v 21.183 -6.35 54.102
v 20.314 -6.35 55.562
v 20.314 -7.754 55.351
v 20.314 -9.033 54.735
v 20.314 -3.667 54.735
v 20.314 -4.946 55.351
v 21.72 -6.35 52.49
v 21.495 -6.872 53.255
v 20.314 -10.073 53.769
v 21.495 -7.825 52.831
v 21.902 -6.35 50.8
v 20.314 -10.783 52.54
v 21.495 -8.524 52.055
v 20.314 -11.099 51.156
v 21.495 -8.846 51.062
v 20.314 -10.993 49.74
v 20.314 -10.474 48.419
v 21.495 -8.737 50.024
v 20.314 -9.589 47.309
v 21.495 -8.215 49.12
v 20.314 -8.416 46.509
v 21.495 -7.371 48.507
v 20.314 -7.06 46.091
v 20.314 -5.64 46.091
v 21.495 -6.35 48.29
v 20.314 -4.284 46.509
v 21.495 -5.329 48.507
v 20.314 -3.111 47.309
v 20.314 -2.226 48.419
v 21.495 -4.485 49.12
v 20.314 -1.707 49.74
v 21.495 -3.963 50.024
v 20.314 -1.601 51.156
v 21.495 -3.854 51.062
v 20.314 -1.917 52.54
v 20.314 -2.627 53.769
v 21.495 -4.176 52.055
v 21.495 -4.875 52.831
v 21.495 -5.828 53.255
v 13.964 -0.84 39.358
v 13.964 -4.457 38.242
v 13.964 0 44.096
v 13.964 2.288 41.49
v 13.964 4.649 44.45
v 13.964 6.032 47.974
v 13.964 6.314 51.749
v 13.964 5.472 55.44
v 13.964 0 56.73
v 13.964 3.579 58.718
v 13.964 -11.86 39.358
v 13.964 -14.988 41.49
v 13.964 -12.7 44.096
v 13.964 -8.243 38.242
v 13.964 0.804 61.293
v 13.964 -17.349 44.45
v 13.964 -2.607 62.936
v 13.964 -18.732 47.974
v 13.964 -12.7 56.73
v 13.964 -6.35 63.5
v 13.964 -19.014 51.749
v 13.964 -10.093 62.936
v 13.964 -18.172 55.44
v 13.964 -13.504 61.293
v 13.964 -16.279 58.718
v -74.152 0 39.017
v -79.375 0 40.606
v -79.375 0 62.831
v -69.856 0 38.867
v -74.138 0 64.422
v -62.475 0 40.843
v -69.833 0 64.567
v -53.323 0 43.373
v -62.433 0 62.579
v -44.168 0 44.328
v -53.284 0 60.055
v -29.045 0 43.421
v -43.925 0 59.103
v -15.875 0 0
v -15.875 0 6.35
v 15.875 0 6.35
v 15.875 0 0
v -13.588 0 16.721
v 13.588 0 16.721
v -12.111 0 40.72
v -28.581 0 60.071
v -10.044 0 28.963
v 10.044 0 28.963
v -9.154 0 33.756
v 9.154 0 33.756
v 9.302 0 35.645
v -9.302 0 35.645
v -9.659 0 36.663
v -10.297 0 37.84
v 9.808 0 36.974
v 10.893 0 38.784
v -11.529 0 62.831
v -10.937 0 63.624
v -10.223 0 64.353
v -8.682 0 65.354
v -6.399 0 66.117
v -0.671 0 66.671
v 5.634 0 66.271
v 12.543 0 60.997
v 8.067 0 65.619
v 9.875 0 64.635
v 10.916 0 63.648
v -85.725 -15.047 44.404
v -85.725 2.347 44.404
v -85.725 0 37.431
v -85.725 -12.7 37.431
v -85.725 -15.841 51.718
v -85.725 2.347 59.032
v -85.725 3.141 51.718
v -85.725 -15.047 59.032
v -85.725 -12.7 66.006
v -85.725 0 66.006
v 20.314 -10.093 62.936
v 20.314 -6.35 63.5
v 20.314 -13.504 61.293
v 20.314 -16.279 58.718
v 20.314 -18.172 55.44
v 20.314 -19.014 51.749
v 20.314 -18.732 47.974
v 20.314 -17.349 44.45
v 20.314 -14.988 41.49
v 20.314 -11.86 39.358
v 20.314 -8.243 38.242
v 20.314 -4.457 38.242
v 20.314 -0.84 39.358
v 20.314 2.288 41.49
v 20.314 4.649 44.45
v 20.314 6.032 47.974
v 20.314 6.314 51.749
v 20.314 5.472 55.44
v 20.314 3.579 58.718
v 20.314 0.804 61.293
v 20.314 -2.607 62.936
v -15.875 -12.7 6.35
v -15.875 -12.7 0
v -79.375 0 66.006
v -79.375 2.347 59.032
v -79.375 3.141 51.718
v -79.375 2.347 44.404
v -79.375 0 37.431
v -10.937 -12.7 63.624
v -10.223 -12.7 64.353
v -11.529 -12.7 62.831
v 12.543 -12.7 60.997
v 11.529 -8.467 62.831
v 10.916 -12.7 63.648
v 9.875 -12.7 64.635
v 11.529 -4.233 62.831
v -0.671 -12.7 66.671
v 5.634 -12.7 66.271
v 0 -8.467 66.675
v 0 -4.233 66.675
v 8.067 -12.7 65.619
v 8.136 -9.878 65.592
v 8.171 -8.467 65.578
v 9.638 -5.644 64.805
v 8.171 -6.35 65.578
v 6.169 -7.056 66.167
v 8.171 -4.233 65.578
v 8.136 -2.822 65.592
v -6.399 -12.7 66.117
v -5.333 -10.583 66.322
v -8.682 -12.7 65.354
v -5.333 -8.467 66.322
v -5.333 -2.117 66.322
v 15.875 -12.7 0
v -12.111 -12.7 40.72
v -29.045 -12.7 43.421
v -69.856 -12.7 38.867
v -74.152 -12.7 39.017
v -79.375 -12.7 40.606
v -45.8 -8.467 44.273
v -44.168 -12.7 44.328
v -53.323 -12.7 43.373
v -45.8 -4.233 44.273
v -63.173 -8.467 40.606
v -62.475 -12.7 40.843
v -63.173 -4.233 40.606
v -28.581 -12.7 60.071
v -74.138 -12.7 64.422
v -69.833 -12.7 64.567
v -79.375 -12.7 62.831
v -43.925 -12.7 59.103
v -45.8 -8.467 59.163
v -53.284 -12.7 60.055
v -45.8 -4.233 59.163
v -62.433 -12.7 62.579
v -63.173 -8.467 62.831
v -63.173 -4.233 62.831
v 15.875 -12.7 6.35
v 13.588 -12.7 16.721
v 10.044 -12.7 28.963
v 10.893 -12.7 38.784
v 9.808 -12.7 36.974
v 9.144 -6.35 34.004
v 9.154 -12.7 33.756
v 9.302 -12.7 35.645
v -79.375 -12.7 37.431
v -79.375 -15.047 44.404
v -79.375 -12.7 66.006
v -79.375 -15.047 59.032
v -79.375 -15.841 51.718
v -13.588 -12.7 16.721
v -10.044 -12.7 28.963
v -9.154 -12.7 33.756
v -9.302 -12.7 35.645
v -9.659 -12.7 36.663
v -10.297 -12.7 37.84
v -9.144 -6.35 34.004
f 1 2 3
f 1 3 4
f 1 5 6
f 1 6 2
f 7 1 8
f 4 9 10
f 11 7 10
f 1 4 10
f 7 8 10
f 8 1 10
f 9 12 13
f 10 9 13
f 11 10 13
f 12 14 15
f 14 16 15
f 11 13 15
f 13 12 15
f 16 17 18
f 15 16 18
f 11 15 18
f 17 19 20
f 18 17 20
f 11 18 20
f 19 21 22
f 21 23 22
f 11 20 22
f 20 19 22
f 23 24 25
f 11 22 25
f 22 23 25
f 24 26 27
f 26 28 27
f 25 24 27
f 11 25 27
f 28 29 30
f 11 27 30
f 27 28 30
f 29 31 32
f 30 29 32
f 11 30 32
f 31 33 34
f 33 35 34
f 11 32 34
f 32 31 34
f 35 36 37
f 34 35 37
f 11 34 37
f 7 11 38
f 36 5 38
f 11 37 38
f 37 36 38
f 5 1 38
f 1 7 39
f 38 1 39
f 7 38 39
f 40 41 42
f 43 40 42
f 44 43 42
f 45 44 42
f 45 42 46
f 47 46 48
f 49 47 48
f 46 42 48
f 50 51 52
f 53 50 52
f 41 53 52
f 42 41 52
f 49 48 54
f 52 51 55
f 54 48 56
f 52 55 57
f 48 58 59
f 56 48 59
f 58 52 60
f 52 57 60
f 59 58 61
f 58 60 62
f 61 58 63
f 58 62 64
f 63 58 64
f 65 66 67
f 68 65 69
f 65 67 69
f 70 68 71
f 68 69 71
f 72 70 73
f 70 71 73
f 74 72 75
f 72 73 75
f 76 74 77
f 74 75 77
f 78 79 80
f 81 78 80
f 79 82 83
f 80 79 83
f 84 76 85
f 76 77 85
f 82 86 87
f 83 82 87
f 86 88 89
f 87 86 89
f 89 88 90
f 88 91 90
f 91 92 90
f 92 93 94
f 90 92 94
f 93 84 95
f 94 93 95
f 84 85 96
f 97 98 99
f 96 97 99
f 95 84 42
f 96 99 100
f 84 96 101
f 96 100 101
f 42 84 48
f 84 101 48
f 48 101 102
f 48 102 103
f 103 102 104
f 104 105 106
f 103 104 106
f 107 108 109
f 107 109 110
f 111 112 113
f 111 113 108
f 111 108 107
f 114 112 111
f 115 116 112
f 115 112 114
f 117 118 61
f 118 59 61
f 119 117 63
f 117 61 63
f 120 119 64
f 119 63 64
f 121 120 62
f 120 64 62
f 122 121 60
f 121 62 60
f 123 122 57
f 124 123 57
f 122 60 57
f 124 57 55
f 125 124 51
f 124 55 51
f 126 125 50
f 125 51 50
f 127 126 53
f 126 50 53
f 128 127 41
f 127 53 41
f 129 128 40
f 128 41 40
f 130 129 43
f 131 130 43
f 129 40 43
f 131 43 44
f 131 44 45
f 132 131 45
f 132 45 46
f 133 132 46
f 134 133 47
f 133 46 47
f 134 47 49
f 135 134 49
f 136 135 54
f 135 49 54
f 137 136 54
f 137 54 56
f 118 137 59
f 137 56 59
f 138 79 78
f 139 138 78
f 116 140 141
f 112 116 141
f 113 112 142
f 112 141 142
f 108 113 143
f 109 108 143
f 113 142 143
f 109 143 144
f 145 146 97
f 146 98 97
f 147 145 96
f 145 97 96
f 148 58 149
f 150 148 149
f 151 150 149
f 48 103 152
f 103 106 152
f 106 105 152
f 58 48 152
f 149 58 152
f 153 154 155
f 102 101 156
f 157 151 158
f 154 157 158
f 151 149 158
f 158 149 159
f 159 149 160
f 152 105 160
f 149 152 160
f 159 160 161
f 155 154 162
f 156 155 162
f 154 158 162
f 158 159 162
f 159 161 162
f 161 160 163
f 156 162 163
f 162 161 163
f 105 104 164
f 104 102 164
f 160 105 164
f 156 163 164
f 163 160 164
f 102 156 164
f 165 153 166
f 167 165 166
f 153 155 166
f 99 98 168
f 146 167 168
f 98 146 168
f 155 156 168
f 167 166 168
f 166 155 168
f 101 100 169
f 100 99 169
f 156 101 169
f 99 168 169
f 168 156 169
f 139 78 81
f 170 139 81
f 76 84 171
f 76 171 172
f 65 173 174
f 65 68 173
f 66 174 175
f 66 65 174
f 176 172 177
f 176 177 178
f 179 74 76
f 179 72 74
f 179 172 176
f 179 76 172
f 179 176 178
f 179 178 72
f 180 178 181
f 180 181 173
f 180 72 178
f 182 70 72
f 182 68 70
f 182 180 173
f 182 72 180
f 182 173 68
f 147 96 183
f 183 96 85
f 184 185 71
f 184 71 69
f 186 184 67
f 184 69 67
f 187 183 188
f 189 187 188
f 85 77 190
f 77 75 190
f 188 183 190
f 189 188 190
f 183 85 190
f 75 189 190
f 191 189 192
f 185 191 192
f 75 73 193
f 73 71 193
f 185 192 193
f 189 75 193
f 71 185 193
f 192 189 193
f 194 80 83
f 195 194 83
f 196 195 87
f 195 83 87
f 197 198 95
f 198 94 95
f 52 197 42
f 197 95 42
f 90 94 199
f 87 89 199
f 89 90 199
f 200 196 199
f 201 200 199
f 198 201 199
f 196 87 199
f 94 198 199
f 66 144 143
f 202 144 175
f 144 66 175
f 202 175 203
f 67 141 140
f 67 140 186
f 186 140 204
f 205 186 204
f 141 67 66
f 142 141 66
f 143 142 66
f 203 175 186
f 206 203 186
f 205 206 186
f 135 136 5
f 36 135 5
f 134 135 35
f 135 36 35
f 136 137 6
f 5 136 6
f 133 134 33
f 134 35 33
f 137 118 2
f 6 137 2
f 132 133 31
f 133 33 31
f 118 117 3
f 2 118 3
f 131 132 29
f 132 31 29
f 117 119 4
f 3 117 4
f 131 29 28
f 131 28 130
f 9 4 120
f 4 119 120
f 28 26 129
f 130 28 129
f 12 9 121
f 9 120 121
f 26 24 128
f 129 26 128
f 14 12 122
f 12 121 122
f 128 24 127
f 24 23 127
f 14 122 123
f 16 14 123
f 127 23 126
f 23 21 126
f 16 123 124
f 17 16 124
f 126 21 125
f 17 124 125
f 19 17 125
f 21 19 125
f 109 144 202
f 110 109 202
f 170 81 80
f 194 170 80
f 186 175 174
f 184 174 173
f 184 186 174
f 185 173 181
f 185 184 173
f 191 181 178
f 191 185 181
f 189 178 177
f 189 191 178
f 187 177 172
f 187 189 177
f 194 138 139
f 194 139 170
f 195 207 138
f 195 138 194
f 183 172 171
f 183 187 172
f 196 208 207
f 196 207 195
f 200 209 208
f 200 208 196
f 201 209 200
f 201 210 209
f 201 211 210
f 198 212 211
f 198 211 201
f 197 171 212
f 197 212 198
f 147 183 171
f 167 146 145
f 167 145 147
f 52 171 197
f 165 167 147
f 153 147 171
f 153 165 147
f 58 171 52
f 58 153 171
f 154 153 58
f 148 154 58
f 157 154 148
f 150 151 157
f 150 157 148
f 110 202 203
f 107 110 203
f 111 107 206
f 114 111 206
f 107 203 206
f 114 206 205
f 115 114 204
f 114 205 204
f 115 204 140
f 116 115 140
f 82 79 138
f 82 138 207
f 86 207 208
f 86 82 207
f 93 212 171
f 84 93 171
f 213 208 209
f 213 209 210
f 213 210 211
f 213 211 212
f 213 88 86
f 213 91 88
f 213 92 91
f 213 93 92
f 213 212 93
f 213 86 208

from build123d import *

# Parameters (mm, degrees)
F1_DEPTH = 12.7
F6_DEPTH = 6.35


with BuildPart() as f1:
    # F0 (on Front) → F1 (new body)
    with BuildSketch(Plane.XZ):
        with BuildLine():
            Line((-15.875, 0), (0, 0))
            Line((0, 0), (15.875, 0))
            Line((15.875, 0), (15.875, 6.35))
            add(Edge.make_bspline(
                [(15.875, 6.35), (14.3420179327, 17.0394802796), (5.8813492916, 36.6883459695), (11.1821779514, 38.0381281856), (14.6685008157, 45.5612496266)],
                knots=[0, 0, 0, 0, 0.598491381, 1, 1, 1, 1], degree=3))
            Line((14.6685008157, 45.5612496266), (14.6685008157, 53.8162496266))
            add(Edge.make_bspline(
                [(14.6685008157, 53.8162496266), (13.6060252977, 58.4911509281), (11.9683632001, 63.5751361722), (7.8926925483, 66.675), (0, 66.675)],
                knots=[0, 0, 0, 0, 0.4698465014, 1, 1, 1, 1], degree=3))
            add(Edge.make_bspline(
                [(-11.5289213136, 62.830530107), (-10.0534236035, 65.0315963465), (-7.8926925483, 66.675), (0, 66.675)],
                knots=[0.4698465014, 0.4698465014, 0.4698465014, 0.4698465014, 1, 1, 1, 1], degree=3))
            add(Edge.make_bspline(
                [(-11.5289213136, 62.830530107), (-21.9231955091, 60.7749481925), (-45.6366234217, 57.1819541314), (-63.4040143954, 62.7706953829), (-71.9872220853, 65.9773216858), (-79.375, 62.830530107)],
                knots=[0, 0, 0, 0, 0.4160850402, 0.7147230898, 1, 1, 1, 1], degree=3))
            Line((-79.375, 62.830530107), (-79.375, 40.605530107))
            add(Edge.make_bspline(
                [(-12.1110297993, 40.7199813665), (-22.4342460064, 42.7378543308), (-45.7738037723, 46.2109559383), (-63.4040143954, 40.6653648311), (-71.9872220853, 37.4587385283), (-79.375, 40.605530107)],
                knots=[0.0077209057, 0.0077209057, 0.0077209057, 0.0077209057, 0.4160850402, 0.7147230898, 1, 1, 1, 1], degree=3))
            add(Edge.make_bspline(
                [(-15.875, 6.35), (-14.3420179327, 17.0394802796), (-6.8186021949, 34.5116910034), (-10.176628142, 37.5145162123), (-12.111029794, 40.7199813758)],
                knots=[0, 0, 0, 0, 0.598491381, 0.8892223602, 0.8892223602, 0.8892223602, 0.8892223602], degree=3))
            Line((-15.875, 6.35), (-15.875, 0))
        make_face()
    extrude(amount=F1_DEPTH)

    # F3 (on offset) → F4 (revolve)
    with BuildSketch(Plane.XZ.offset(6.35)):
        with BuildLine():
            Line((13.9643816114, 63.5), (13.9643816114, 50.8))
            Line((13.9643816114, 50.8), (21.9018816114, 50.8))
            ThreePointArc((21.9018816114, 50.8), (21.4945552896, 53.3100578928), (20.3143816114, 55.5625))
            Line((20.3143816114, 55.5625), (20.3143816114, 63.5))
            Line((20.3143816114, 63.5), (13.9643816114, 63.5))
        make_face()
    revolve(axis=Axis((17.9331316114, -6.35, 50.8), (1, 0, 0)))

    # F5 (on face) → F6 (join)
    with BuildSketch(Plane(origin=(-79.375, 0, 0), x_dir=(0, -1, 0), z_dir=(-1, 0, 0))):
        with BuildLine():
            Line((12.7, 66.005530107), (6.35, 66.005530107))
            Line((6.35, 66.005530107), (0, 66.005530107))
            ThreePointArc((0, 66.005530107), (-3.1411550024, 51.718030107), (0, 37.430530107))
            Line((0, 37.430530107), (6.35, 37.430530107))
            Line((6.35, 37.430530107), (12.7, 37.430530107))
            ThreePointArc((12.7, 37.430530107), (15.8411550024, 51.718030107), (12.7, 66.005530107))
        make_face()
    extrude(amount=F6_DEPTH)


solid = f1.part
